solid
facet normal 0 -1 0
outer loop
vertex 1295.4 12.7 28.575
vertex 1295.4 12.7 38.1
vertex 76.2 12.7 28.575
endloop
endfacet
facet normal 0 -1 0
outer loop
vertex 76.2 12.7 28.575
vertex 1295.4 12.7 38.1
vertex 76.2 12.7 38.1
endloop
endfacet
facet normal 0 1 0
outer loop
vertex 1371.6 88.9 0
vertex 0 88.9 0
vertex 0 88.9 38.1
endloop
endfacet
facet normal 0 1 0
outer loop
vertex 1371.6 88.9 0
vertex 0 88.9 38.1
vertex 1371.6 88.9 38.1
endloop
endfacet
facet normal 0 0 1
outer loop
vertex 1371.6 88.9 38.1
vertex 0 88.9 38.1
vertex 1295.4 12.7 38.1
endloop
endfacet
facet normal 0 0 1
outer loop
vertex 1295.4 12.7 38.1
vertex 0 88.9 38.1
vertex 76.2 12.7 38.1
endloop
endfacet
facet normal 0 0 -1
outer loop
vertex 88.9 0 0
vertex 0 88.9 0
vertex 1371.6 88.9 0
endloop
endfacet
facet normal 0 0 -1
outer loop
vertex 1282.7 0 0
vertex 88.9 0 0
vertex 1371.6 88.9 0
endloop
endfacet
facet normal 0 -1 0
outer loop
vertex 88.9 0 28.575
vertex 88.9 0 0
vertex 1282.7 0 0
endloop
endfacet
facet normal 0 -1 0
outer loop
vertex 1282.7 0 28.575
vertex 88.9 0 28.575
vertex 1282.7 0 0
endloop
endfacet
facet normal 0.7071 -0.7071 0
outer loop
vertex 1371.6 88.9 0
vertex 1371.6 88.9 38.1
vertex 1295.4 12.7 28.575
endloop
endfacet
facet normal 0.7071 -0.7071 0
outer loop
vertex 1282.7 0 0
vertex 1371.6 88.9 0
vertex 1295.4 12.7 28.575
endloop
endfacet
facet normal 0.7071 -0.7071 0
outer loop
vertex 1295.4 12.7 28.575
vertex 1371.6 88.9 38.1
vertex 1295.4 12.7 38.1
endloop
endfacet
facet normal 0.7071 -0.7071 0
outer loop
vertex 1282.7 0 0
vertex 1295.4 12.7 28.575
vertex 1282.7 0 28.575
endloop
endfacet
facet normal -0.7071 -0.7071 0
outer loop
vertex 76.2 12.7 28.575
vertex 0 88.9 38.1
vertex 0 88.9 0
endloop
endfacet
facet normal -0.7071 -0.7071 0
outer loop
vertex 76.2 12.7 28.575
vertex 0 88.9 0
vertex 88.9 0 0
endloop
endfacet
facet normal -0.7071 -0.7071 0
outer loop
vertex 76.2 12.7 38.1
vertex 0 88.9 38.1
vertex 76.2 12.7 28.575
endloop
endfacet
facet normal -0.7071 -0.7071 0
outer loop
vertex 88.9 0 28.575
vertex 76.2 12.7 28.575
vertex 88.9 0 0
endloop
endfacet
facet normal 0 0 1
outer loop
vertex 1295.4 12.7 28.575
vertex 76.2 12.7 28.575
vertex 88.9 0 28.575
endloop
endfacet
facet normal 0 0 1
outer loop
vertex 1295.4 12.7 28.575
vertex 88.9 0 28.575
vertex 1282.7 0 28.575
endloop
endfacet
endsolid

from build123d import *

# Parameters (mm, degrees)
SKETCH1_W           = 1371.6
SKETCH1_H           = 88.9
BOSS_EXTRUDE1_DEPTH = 38.1
CUT_EXTRUDE1_REACH  = 40.1
CUT_EXTRUDE2_REACH  = 40.1
CUT_EXTRUDE3_DEPTH  = 9.525


with BuildPart() as part:
    # Sketch1 → Boss-Extrude1 (new body)
    with BuildSketch(Plane.XY):
        with Locations((685.8, 44.45)):
            Rectangle(SKETCH1_W, SKETCH1_H)
    extrude(amount=BOSS_EXTRUDE1_DEPTH)

    # Sketch2 → Cut-Extrude1 (cut, up to next)
    with BuildSketch(Plane.XY.offset(38.1), mode=Mode.PRIVATE) as cut_extrude1_sk1:
        Polygon((0, 88.9), (88.9, 0), (0, 0), align=None)
    cut_extrude1_tool1 = extrude(cut_extrude1_sk1.sketch, amount=-CUT_EXTRUDE1_REACH, mode=Mode.PRIVATE) & part.part
    add(cut_extrude1_tool1.solids().sort_by_distance((29.633333, 29.633333, 38.1))[0], mode=Mode.SUBTRACT)

    # Sketch3 → Cut-Extrude2 (cut, up to next)
    with BuildSketch(Plane.XY.offset(38.1), mode=Mode.PRIVATE) as cut_extrude2_sk1:
        Polygon((1371.6, 88.9), (1282.7, 0), (1371.6, 0), align=None)
    cut_extrude2_tool1 = extrude(cut_extrude2_sk1.sketch, amount=-CUT_EXTRUDE2_REACH, mode=Mode.PRIVATE) & part.part
    add(cut_extrude2_tool1.solids().sort_by_distance((1341.966667, 29.633333, 38.1))[0], mode=Mode.SUBTRACT)

    # Sketch4 → Cut-Extrude3 (cut)
    with BuildSketch(Plane.XY.offset(38.1)):
        Polygon((88.9, 0), (1282.7, 0), (1295.4, 12.7), (76.2, 12.7), align=None)
    extrude(amount=-CUT_EXTRUDE3_DEPTH, mode=Mode.SUBTRACT)


solid = part.part
